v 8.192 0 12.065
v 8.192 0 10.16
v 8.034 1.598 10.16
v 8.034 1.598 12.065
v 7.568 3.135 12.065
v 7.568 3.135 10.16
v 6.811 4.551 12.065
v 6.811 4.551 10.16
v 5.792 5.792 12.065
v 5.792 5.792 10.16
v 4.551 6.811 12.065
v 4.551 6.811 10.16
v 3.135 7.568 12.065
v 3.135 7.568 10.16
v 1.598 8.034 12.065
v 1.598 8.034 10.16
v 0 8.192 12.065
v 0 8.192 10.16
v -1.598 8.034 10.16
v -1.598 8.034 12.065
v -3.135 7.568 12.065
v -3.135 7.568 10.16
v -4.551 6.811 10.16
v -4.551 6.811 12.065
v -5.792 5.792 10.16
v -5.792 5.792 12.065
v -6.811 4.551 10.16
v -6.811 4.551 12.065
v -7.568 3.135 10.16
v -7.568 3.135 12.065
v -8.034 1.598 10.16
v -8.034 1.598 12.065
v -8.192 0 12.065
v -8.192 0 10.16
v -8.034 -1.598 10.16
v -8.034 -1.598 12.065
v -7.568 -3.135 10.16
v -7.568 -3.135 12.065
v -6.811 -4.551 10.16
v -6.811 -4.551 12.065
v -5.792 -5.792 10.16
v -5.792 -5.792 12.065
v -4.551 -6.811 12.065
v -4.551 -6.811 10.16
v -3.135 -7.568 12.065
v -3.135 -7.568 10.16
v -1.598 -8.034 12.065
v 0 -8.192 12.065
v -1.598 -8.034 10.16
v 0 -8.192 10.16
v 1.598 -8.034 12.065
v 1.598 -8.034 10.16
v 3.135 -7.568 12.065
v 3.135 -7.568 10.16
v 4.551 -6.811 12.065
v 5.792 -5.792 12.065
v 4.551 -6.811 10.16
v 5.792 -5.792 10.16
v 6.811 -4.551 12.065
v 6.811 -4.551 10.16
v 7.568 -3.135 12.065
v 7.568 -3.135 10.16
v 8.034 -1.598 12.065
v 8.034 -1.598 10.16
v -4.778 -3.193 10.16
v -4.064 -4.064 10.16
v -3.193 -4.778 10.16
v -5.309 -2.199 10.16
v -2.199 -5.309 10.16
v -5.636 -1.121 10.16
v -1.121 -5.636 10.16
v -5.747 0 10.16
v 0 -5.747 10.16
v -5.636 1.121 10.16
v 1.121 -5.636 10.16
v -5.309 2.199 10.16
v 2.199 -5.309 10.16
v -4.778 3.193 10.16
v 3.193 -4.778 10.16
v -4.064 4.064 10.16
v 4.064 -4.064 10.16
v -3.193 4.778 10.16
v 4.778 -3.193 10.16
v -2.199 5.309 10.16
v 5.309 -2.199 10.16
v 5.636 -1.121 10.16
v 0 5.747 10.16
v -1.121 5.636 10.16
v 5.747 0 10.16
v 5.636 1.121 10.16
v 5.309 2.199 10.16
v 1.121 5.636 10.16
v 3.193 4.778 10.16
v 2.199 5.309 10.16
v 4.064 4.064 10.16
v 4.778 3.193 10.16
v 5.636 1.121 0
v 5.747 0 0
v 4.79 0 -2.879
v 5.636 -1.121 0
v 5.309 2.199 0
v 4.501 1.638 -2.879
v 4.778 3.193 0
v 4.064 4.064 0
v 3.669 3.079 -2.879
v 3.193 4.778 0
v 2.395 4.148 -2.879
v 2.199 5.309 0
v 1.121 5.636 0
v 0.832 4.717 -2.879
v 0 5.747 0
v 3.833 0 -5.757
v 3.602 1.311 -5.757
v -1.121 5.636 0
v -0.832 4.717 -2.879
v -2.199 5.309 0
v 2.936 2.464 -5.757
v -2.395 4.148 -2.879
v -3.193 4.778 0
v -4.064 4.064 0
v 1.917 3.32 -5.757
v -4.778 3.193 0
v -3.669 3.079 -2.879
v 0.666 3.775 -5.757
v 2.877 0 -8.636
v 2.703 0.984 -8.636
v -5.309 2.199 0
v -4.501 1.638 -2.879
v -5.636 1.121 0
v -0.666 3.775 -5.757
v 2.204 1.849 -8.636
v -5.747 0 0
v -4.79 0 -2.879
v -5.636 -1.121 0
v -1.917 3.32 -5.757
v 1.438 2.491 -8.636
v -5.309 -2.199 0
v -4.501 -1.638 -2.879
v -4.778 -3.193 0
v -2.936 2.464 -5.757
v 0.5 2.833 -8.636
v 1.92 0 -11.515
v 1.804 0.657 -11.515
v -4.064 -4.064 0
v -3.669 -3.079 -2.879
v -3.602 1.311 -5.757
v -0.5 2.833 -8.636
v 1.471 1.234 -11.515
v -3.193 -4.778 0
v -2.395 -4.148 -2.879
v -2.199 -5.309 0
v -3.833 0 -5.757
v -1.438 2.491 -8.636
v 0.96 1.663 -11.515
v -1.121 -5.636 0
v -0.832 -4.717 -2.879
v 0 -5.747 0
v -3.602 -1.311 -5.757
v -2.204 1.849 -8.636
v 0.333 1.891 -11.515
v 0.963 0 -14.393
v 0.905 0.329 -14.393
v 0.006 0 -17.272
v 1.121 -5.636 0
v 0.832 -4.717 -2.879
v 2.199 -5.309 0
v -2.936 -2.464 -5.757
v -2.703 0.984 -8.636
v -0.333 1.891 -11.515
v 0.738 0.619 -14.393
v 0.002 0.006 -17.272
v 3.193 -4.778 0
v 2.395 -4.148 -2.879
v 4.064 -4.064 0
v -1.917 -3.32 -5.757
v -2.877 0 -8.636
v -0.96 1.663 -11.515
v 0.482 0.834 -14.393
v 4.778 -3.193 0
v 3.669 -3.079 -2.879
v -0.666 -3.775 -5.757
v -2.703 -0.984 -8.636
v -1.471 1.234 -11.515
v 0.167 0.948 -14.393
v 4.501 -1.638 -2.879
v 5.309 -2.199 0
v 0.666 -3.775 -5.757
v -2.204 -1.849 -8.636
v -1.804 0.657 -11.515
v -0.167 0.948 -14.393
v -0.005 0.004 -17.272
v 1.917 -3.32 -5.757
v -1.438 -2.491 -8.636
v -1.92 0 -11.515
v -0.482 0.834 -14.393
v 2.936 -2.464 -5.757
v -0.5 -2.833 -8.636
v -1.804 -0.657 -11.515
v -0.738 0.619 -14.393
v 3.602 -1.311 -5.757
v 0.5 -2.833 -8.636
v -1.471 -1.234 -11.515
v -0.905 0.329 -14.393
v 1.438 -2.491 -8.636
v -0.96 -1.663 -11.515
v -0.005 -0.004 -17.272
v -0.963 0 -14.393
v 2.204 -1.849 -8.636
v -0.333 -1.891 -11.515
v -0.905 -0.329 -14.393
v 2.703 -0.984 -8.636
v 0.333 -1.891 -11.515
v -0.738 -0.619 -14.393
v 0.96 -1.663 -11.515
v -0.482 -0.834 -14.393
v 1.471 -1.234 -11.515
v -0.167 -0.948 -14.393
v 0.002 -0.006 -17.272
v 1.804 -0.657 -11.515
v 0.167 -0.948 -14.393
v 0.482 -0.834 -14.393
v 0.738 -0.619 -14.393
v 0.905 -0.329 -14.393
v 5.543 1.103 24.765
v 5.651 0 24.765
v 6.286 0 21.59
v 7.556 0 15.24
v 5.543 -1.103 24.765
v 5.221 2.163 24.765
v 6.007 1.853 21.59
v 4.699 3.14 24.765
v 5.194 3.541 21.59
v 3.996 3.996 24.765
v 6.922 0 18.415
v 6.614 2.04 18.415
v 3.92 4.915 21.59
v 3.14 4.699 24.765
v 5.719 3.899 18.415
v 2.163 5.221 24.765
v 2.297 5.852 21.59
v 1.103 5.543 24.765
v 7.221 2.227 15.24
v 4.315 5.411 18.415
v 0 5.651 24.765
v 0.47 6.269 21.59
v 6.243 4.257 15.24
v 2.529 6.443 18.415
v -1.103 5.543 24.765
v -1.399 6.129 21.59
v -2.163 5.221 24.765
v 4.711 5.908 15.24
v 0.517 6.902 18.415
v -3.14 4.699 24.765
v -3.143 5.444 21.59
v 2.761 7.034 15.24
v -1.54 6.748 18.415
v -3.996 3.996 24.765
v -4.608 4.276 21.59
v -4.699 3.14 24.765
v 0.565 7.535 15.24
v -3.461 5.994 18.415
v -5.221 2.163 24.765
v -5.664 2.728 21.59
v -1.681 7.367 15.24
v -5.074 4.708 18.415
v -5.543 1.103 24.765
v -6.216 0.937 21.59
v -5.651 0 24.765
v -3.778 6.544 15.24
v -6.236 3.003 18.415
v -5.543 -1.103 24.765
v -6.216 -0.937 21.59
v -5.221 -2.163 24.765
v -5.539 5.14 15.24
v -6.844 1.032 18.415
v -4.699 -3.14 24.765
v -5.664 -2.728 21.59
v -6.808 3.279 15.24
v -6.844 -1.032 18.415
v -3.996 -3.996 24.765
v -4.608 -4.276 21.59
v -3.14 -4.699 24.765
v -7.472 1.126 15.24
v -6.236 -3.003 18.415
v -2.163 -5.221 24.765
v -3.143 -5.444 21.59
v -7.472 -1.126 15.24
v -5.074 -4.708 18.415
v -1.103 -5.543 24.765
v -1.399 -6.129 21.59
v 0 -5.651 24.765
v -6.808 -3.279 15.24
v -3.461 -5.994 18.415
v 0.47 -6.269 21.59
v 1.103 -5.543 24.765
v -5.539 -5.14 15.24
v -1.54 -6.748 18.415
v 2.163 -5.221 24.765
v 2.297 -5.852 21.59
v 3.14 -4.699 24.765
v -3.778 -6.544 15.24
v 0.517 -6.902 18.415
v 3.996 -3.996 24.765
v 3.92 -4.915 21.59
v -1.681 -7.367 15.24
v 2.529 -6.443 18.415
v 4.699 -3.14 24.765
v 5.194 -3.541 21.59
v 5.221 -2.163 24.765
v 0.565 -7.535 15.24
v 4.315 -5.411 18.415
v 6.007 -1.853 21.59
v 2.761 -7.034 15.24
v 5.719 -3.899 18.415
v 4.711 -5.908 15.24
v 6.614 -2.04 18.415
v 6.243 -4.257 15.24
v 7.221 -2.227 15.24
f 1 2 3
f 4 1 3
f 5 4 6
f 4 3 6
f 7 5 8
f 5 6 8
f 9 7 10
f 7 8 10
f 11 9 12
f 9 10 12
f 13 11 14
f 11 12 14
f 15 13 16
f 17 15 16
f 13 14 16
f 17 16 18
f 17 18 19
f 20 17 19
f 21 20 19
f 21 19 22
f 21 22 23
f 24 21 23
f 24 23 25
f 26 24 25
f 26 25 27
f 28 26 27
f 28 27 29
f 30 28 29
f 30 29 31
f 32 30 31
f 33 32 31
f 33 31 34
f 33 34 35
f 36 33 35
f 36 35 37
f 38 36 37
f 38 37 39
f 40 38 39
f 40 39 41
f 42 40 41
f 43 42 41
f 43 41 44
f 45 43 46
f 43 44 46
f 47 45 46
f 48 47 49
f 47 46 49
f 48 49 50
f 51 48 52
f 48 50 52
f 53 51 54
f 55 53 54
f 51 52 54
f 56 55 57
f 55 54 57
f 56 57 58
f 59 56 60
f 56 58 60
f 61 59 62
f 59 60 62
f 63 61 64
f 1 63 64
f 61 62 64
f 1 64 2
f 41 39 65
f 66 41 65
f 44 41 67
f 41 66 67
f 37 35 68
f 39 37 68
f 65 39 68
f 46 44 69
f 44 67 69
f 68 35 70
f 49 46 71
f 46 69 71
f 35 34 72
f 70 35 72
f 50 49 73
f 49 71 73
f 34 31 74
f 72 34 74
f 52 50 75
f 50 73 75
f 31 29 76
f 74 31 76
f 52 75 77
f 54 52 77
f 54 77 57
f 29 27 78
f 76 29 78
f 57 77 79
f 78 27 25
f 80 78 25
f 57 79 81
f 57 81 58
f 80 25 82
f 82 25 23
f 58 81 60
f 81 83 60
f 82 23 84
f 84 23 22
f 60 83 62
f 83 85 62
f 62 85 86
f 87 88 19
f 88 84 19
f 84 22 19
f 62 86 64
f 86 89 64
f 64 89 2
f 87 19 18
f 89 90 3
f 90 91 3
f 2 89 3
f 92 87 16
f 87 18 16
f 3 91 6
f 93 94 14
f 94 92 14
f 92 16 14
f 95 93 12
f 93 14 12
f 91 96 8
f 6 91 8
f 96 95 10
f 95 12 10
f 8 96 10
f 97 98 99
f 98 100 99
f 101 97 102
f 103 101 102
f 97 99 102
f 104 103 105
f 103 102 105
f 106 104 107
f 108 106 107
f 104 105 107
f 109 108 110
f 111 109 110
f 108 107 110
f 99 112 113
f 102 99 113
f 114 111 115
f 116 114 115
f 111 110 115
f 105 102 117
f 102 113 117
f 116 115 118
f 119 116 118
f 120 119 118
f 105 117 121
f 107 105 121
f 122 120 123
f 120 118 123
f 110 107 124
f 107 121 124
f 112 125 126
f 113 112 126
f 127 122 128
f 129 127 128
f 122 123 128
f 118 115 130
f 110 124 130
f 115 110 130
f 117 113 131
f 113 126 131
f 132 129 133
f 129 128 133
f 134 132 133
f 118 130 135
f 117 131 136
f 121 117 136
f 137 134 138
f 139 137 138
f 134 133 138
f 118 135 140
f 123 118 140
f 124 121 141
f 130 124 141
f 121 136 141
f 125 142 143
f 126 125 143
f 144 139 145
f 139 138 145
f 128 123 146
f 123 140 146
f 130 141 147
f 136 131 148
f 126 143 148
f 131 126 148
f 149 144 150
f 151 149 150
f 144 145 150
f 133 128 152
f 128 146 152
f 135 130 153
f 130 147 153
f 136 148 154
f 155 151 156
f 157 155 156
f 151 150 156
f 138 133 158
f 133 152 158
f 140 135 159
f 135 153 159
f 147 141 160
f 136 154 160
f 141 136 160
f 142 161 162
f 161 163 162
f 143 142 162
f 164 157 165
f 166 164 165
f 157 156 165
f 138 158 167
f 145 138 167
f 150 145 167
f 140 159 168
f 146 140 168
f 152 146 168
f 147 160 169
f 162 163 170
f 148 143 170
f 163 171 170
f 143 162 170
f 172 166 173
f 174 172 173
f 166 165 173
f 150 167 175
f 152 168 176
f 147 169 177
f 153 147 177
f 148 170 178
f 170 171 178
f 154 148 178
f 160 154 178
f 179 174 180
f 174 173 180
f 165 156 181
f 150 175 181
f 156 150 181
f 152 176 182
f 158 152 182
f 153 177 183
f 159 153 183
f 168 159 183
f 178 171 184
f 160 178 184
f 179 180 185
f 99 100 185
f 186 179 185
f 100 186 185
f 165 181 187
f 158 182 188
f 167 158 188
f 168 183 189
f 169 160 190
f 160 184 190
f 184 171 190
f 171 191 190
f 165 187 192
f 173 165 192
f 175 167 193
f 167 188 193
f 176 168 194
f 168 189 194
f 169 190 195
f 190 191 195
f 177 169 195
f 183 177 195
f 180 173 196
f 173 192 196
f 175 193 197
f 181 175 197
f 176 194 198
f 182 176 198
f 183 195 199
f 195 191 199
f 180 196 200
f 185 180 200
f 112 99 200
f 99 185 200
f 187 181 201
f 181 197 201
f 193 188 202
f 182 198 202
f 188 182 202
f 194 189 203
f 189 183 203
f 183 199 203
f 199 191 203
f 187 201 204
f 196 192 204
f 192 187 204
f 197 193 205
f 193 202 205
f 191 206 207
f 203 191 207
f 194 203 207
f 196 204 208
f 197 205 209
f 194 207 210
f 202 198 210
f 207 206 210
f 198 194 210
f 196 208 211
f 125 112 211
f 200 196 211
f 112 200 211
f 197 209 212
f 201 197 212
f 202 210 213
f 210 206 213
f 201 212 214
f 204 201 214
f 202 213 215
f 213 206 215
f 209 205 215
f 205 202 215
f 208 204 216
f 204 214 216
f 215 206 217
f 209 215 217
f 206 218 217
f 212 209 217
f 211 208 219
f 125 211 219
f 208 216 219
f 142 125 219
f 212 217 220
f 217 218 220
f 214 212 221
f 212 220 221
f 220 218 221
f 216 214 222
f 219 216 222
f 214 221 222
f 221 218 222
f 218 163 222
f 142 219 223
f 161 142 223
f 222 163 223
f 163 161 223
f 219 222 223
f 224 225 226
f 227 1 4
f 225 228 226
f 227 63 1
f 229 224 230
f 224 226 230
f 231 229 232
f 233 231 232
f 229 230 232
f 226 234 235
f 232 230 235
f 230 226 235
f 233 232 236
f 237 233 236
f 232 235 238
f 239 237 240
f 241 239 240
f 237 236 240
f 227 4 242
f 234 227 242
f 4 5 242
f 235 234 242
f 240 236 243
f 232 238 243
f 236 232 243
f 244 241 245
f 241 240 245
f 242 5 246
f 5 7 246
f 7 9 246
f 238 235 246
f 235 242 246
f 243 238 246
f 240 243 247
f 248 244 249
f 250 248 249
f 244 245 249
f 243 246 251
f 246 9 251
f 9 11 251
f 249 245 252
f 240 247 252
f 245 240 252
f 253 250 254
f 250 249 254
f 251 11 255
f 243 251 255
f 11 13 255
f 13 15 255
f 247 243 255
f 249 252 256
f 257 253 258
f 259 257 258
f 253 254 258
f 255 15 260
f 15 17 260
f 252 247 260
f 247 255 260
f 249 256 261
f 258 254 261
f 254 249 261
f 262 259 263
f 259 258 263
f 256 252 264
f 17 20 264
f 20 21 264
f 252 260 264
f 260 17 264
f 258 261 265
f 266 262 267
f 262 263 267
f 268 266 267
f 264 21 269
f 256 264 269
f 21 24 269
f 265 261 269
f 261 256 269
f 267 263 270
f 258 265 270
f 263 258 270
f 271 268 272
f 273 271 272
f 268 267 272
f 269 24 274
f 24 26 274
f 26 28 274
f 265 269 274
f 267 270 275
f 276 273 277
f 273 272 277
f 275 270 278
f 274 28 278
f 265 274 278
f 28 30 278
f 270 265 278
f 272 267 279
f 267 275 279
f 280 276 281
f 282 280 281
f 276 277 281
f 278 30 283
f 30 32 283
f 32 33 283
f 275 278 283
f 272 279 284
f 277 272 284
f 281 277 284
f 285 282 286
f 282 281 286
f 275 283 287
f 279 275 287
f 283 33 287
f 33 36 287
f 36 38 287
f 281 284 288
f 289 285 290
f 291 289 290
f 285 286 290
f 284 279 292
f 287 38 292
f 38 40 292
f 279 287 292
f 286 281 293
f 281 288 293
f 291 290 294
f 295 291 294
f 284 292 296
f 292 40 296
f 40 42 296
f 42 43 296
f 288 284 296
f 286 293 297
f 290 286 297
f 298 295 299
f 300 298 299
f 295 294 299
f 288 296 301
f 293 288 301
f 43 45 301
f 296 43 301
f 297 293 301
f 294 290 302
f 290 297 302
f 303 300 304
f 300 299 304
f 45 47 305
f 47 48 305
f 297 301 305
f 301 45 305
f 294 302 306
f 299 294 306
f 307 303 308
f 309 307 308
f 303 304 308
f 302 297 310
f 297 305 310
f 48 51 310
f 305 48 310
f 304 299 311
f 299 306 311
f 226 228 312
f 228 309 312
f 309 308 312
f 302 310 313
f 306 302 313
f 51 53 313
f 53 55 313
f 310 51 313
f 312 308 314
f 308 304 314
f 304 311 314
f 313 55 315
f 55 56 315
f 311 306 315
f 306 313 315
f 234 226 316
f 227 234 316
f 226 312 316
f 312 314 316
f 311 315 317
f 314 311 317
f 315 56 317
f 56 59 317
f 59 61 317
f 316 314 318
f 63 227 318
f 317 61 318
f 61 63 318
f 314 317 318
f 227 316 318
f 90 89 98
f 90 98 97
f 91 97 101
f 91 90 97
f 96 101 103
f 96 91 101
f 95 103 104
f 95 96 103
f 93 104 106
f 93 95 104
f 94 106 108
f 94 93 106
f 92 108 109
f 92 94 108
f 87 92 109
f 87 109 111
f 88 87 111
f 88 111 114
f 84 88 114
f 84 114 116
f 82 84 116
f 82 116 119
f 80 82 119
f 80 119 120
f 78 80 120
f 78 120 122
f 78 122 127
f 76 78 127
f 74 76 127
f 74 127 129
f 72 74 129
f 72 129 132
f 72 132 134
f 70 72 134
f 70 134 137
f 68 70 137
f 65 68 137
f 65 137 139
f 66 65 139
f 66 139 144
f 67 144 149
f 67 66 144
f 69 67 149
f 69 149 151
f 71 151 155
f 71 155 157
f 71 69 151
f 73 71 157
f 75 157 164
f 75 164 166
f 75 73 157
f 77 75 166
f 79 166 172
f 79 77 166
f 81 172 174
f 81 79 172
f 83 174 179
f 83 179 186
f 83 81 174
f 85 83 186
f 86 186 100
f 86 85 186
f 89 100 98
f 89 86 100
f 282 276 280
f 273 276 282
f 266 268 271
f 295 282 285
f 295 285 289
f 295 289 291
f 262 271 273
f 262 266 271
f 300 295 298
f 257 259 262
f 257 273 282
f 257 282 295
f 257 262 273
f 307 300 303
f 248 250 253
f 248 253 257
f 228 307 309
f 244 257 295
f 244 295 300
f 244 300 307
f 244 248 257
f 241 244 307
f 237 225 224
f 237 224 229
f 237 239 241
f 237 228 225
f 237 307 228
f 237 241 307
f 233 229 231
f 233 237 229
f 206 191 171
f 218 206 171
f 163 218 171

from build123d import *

# Parameters (mm, degrees)
F0_R     = 5.74675
F1_DEPTH = 10.16
F2_R     = 8.1915
F2_R_2   = 5.74675
F3_DEPTH = 1.905
F4_R     = 8.1915
F5_DEPTH = 12.7
F6_SIZE2 = 12.7
F6_SIZE  = 2.54
F7_DEPTH = 17.272
F8_SIZE2 = 5.74039
F8_SIZE  = 17.27199


# Not quite as in the source:
# - a fillet or chamfer is up to 0.001 mm smaller than in the source, because OpenCascade refuses the exact size


with BuildPart() as f1:
    # F0 (on Top) → F1 (new body)
    with BuildSketch(Plane.XY):
        Circle(F0_R)
    extrude(amount=F1_DEPTH)

    # F2 (on face) → F3 (join)
    with BuildSketch(Plane.XY.offset(10.16)):
        Circle(F2_R)
        Circle(F2_R_2, mode=Mode.SUBTRACT)
        Circle(F2_R_2)
    extrude(amount=F3_DEPTH)

    # F4 (on face) → F5 (join)
    with BuildSketch(Plane.XY.offset(12.065)):
        Circle(F4_R)
    extrude(amount=F5_DEPTH)

    # F6
    f6_edges = [f1.edges().sort_by_distance(p)[0] for p in [
        (-8.1915, 0, 24.765),
    ]]
    f6_side = f1.faces().sort_by_distance((0, 0, 24.765))[0]
    chamfer(f6_edges, length=F6_SIZE, length2=F6_SIZE2, reference=f6_side)

    # F7 (add): a face of the model
    f7_faces = [f1.faces().sort_by_distance(p)[0] for p in [
        (0, 0, 0),
    ]]
    extrude(f7_faces, amount=F7_DEPTH)

    # F8 (size 17.272 and 5.7404 in the source; OpenCascade refuses exactly that, so slightly less here)
    f8_edges = [f1.edges().sort_by_distance(p)[0] for p in [
        (-5.74675, 0, -17.272),
    ]]
    f8_side = f1.faces().sort_by_distance((-5.74675, 0, -8.636))[0]
    chamfer(f8_edges, length=F8_SIZE, length2=F8_SIZE2, reference=f8_side)


solid = f1.part
